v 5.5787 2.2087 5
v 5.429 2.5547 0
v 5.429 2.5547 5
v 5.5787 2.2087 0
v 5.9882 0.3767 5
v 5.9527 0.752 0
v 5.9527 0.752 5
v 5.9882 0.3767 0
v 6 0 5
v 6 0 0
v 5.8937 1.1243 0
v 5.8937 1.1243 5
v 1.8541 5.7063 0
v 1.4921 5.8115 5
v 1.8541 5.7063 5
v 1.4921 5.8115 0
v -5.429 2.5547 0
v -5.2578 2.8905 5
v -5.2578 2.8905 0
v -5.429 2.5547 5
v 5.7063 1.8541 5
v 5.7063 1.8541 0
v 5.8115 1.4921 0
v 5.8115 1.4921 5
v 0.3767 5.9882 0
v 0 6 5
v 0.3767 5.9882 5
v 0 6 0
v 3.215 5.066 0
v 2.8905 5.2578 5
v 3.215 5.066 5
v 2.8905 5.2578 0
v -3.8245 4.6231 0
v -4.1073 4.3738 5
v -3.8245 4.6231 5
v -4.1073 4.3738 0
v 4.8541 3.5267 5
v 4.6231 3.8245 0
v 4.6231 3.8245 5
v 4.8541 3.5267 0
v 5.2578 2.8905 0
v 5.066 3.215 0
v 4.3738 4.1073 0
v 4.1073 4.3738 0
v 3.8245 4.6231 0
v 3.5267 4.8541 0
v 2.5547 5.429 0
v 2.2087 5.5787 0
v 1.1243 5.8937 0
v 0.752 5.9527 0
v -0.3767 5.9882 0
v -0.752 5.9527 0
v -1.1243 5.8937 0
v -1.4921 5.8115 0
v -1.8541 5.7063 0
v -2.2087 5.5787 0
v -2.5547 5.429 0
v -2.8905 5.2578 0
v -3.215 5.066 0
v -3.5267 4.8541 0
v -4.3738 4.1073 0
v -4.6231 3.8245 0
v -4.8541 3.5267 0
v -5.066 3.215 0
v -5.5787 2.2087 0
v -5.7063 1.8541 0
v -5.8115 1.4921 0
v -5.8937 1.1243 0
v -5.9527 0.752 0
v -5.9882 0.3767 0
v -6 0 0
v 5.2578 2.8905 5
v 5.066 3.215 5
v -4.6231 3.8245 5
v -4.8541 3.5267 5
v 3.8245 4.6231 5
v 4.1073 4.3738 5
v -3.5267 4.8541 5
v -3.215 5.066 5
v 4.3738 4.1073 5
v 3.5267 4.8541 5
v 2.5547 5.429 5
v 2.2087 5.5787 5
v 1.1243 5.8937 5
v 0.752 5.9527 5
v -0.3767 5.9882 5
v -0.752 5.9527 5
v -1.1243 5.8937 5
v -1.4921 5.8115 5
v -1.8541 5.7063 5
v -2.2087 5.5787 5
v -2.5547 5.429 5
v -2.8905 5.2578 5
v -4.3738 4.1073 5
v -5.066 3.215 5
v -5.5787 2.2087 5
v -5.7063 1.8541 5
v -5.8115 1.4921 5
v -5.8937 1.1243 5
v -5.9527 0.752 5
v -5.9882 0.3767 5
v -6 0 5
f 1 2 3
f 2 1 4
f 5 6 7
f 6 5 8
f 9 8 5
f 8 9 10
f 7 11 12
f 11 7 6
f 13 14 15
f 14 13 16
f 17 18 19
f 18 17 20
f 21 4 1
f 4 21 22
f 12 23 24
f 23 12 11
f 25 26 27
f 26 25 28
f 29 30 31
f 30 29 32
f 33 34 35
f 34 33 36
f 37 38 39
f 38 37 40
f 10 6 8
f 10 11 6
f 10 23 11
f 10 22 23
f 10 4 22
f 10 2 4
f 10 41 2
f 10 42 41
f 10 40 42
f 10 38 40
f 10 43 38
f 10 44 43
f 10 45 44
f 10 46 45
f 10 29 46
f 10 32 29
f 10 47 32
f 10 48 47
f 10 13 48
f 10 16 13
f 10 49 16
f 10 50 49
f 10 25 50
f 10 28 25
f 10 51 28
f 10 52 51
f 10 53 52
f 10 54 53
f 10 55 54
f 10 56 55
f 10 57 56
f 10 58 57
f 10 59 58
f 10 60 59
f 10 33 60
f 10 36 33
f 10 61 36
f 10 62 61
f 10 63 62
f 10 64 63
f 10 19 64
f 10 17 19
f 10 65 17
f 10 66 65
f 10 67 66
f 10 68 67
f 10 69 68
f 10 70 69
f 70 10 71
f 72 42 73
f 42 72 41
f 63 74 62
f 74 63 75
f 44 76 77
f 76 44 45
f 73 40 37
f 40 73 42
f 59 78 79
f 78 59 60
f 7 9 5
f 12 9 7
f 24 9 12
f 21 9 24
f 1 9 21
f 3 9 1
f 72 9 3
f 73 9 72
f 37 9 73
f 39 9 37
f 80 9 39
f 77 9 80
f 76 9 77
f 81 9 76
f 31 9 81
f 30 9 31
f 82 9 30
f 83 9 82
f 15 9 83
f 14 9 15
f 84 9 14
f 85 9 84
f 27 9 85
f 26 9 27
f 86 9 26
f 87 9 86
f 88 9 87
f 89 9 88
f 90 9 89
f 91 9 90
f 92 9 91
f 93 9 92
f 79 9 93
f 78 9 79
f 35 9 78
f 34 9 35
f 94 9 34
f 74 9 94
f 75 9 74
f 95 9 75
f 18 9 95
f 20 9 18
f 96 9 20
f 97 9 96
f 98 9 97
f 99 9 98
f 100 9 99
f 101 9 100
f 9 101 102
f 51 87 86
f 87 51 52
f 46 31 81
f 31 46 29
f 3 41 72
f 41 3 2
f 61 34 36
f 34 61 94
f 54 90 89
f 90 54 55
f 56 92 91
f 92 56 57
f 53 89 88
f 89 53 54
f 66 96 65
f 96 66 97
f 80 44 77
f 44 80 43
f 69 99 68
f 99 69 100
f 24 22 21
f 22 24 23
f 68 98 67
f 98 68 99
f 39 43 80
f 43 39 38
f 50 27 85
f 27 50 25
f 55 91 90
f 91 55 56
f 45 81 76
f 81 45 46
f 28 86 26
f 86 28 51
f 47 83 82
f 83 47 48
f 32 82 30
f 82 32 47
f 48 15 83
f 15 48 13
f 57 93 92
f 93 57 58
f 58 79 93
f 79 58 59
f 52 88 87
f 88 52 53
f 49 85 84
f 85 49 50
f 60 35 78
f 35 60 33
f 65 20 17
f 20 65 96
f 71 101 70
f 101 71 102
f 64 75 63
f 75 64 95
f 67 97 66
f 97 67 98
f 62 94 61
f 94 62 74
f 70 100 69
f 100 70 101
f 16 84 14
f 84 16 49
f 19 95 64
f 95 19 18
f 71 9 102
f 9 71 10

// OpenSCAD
difference(){
	union(){
        translate([0,0,0]){
            rotate([0,0,0]){
                cylinder(h=5, r=6, $fn=100, center=false);
            }
        }
    }        
	union() {
          translate([-10,-10,-10]){
            cube([20,10,20], center=false);
        }         
	}
}
